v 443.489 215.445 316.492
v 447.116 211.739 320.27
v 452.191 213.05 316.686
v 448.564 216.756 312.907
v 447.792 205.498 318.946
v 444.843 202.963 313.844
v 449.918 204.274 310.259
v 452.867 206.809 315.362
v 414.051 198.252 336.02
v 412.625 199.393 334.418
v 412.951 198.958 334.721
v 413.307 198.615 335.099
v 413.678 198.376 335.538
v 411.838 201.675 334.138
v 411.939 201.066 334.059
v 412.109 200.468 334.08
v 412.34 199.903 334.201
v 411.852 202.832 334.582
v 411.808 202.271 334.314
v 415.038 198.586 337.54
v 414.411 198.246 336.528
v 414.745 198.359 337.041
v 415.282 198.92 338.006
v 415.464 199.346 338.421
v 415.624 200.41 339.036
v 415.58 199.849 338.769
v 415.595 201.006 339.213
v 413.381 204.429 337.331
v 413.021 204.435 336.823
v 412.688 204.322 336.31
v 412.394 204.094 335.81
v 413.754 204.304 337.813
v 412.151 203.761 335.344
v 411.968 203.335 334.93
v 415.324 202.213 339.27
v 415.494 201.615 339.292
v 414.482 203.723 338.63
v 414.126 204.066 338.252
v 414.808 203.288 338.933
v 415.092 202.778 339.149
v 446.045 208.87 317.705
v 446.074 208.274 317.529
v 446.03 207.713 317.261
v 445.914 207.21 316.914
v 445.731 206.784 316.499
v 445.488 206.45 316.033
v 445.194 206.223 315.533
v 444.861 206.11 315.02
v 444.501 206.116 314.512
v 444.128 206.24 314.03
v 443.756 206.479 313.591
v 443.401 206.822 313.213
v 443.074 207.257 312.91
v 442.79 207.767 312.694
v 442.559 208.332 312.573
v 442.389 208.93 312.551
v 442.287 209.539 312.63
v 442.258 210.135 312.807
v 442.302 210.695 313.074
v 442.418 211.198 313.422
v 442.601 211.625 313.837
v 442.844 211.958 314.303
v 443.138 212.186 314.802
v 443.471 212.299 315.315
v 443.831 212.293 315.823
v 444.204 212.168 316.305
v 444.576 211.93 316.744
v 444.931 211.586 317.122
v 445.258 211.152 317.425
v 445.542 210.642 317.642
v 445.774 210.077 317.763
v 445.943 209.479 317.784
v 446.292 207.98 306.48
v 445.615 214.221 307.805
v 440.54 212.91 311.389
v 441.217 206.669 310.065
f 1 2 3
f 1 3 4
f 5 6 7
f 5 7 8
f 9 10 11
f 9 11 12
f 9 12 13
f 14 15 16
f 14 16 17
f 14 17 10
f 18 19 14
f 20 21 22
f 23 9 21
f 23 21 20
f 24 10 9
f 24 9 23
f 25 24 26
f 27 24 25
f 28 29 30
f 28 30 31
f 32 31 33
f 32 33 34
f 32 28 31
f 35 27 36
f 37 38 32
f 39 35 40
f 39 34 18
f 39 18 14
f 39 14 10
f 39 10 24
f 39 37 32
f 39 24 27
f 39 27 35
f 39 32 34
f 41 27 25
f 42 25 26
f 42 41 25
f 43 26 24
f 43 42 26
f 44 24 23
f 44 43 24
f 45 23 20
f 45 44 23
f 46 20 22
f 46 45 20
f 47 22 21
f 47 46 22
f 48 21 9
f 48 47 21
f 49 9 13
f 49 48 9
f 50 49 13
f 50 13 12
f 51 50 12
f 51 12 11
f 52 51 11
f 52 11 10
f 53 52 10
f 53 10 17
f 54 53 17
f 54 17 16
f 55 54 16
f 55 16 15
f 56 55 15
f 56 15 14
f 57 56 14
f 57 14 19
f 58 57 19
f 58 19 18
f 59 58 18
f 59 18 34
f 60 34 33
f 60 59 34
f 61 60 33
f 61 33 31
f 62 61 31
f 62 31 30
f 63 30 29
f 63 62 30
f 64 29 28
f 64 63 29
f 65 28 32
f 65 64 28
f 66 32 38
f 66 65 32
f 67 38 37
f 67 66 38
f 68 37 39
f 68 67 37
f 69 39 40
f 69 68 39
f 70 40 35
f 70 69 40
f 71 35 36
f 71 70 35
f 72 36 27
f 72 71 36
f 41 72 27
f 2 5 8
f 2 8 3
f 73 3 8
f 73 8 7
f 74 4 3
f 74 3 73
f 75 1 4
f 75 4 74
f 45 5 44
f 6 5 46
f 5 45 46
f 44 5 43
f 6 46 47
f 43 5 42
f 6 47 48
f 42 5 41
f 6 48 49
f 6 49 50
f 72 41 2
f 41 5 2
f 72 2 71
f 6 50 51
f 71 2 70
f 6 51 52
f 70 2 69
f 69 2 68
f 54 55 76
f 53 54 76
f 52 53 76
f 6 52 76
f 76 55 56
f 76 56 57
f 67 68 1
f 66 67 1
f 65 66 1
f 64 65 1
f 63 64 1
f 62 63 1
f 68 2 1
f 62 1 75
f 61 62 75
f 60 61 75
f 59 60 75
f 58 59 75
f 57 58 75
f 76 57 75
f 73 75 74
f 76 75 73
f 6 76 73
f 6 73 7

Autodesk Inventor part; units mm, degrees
ref_plane "YZ Plane" through (0, 0, 0) normal (1, 0, 0) x (0, 1, 0)
ref_plane "XZ Plane" through (0, 0, 0) normal (0, 1, 0) x (-1, 0, 0)
ref_plane "XY Plane" through (0, 0, 0) normal (0, 0, 1) x (1, 0, 0)
ref_plane "Work Plane1" through (444.1661, 209.2043, 315.1677) normal (0.7992, 0.2064, -0.5645) x (-0.5917, 0.1054, -0.7992)
sketch "Sketch1" plane through (444.1661, 209.2043, 315.1677) normal (0.7992, 0.2064, -0.5645) x (-0.5917, 0.1054, -0.7992)
  line L0 (0, 6.4158) -> (5.5562, 3.2079)
  line L1 (5.5562, 3.2079) -> (5.5562, -3.2079)
  line L2 (5.5562, -3.2079) -> (0, -6.4158)
  line L3 (0, -6.4158) -> (-5.5562, -3.2079)
  line L4 (-5.5562, -3.2079) -> (-5.5562, 3.2079)
  line L5 (-5.5562, 3.2079) -> (0, 6.4158)
  point P0 (492.659, -221.7278)
  point P1 (0, 0)
  point P2 (5.5563, 0)
  dimension "d0" = 11.1125
extrude "Extrusion1" add sketch "Sketch1" along normal blind 6.35
sketch "Sketch2" plane through (444.1661, 209.2043, 315.1677) normal (-0.7992, -0.2064, 0.5645) x (0.5917, -0.1054, 0.7992)
  circle A0 centre (0, 0) radius 3.175
  line L0 (-5.5562, 3.2079) -> (-5.5562, -3.2079) projected
  line L1 (0, 6.4158) -> (-5.5562, 3.2079) projected
  point P0 (-492.659, -221.7278)
  dimension "d3" = 6.35
  dimension "d4" = 5.5563
  dimension "d5" = 5.5563
extrude "Extrusion2" add sketch "Sketch2" along normal blind 38.1
properties part number "bolt"
